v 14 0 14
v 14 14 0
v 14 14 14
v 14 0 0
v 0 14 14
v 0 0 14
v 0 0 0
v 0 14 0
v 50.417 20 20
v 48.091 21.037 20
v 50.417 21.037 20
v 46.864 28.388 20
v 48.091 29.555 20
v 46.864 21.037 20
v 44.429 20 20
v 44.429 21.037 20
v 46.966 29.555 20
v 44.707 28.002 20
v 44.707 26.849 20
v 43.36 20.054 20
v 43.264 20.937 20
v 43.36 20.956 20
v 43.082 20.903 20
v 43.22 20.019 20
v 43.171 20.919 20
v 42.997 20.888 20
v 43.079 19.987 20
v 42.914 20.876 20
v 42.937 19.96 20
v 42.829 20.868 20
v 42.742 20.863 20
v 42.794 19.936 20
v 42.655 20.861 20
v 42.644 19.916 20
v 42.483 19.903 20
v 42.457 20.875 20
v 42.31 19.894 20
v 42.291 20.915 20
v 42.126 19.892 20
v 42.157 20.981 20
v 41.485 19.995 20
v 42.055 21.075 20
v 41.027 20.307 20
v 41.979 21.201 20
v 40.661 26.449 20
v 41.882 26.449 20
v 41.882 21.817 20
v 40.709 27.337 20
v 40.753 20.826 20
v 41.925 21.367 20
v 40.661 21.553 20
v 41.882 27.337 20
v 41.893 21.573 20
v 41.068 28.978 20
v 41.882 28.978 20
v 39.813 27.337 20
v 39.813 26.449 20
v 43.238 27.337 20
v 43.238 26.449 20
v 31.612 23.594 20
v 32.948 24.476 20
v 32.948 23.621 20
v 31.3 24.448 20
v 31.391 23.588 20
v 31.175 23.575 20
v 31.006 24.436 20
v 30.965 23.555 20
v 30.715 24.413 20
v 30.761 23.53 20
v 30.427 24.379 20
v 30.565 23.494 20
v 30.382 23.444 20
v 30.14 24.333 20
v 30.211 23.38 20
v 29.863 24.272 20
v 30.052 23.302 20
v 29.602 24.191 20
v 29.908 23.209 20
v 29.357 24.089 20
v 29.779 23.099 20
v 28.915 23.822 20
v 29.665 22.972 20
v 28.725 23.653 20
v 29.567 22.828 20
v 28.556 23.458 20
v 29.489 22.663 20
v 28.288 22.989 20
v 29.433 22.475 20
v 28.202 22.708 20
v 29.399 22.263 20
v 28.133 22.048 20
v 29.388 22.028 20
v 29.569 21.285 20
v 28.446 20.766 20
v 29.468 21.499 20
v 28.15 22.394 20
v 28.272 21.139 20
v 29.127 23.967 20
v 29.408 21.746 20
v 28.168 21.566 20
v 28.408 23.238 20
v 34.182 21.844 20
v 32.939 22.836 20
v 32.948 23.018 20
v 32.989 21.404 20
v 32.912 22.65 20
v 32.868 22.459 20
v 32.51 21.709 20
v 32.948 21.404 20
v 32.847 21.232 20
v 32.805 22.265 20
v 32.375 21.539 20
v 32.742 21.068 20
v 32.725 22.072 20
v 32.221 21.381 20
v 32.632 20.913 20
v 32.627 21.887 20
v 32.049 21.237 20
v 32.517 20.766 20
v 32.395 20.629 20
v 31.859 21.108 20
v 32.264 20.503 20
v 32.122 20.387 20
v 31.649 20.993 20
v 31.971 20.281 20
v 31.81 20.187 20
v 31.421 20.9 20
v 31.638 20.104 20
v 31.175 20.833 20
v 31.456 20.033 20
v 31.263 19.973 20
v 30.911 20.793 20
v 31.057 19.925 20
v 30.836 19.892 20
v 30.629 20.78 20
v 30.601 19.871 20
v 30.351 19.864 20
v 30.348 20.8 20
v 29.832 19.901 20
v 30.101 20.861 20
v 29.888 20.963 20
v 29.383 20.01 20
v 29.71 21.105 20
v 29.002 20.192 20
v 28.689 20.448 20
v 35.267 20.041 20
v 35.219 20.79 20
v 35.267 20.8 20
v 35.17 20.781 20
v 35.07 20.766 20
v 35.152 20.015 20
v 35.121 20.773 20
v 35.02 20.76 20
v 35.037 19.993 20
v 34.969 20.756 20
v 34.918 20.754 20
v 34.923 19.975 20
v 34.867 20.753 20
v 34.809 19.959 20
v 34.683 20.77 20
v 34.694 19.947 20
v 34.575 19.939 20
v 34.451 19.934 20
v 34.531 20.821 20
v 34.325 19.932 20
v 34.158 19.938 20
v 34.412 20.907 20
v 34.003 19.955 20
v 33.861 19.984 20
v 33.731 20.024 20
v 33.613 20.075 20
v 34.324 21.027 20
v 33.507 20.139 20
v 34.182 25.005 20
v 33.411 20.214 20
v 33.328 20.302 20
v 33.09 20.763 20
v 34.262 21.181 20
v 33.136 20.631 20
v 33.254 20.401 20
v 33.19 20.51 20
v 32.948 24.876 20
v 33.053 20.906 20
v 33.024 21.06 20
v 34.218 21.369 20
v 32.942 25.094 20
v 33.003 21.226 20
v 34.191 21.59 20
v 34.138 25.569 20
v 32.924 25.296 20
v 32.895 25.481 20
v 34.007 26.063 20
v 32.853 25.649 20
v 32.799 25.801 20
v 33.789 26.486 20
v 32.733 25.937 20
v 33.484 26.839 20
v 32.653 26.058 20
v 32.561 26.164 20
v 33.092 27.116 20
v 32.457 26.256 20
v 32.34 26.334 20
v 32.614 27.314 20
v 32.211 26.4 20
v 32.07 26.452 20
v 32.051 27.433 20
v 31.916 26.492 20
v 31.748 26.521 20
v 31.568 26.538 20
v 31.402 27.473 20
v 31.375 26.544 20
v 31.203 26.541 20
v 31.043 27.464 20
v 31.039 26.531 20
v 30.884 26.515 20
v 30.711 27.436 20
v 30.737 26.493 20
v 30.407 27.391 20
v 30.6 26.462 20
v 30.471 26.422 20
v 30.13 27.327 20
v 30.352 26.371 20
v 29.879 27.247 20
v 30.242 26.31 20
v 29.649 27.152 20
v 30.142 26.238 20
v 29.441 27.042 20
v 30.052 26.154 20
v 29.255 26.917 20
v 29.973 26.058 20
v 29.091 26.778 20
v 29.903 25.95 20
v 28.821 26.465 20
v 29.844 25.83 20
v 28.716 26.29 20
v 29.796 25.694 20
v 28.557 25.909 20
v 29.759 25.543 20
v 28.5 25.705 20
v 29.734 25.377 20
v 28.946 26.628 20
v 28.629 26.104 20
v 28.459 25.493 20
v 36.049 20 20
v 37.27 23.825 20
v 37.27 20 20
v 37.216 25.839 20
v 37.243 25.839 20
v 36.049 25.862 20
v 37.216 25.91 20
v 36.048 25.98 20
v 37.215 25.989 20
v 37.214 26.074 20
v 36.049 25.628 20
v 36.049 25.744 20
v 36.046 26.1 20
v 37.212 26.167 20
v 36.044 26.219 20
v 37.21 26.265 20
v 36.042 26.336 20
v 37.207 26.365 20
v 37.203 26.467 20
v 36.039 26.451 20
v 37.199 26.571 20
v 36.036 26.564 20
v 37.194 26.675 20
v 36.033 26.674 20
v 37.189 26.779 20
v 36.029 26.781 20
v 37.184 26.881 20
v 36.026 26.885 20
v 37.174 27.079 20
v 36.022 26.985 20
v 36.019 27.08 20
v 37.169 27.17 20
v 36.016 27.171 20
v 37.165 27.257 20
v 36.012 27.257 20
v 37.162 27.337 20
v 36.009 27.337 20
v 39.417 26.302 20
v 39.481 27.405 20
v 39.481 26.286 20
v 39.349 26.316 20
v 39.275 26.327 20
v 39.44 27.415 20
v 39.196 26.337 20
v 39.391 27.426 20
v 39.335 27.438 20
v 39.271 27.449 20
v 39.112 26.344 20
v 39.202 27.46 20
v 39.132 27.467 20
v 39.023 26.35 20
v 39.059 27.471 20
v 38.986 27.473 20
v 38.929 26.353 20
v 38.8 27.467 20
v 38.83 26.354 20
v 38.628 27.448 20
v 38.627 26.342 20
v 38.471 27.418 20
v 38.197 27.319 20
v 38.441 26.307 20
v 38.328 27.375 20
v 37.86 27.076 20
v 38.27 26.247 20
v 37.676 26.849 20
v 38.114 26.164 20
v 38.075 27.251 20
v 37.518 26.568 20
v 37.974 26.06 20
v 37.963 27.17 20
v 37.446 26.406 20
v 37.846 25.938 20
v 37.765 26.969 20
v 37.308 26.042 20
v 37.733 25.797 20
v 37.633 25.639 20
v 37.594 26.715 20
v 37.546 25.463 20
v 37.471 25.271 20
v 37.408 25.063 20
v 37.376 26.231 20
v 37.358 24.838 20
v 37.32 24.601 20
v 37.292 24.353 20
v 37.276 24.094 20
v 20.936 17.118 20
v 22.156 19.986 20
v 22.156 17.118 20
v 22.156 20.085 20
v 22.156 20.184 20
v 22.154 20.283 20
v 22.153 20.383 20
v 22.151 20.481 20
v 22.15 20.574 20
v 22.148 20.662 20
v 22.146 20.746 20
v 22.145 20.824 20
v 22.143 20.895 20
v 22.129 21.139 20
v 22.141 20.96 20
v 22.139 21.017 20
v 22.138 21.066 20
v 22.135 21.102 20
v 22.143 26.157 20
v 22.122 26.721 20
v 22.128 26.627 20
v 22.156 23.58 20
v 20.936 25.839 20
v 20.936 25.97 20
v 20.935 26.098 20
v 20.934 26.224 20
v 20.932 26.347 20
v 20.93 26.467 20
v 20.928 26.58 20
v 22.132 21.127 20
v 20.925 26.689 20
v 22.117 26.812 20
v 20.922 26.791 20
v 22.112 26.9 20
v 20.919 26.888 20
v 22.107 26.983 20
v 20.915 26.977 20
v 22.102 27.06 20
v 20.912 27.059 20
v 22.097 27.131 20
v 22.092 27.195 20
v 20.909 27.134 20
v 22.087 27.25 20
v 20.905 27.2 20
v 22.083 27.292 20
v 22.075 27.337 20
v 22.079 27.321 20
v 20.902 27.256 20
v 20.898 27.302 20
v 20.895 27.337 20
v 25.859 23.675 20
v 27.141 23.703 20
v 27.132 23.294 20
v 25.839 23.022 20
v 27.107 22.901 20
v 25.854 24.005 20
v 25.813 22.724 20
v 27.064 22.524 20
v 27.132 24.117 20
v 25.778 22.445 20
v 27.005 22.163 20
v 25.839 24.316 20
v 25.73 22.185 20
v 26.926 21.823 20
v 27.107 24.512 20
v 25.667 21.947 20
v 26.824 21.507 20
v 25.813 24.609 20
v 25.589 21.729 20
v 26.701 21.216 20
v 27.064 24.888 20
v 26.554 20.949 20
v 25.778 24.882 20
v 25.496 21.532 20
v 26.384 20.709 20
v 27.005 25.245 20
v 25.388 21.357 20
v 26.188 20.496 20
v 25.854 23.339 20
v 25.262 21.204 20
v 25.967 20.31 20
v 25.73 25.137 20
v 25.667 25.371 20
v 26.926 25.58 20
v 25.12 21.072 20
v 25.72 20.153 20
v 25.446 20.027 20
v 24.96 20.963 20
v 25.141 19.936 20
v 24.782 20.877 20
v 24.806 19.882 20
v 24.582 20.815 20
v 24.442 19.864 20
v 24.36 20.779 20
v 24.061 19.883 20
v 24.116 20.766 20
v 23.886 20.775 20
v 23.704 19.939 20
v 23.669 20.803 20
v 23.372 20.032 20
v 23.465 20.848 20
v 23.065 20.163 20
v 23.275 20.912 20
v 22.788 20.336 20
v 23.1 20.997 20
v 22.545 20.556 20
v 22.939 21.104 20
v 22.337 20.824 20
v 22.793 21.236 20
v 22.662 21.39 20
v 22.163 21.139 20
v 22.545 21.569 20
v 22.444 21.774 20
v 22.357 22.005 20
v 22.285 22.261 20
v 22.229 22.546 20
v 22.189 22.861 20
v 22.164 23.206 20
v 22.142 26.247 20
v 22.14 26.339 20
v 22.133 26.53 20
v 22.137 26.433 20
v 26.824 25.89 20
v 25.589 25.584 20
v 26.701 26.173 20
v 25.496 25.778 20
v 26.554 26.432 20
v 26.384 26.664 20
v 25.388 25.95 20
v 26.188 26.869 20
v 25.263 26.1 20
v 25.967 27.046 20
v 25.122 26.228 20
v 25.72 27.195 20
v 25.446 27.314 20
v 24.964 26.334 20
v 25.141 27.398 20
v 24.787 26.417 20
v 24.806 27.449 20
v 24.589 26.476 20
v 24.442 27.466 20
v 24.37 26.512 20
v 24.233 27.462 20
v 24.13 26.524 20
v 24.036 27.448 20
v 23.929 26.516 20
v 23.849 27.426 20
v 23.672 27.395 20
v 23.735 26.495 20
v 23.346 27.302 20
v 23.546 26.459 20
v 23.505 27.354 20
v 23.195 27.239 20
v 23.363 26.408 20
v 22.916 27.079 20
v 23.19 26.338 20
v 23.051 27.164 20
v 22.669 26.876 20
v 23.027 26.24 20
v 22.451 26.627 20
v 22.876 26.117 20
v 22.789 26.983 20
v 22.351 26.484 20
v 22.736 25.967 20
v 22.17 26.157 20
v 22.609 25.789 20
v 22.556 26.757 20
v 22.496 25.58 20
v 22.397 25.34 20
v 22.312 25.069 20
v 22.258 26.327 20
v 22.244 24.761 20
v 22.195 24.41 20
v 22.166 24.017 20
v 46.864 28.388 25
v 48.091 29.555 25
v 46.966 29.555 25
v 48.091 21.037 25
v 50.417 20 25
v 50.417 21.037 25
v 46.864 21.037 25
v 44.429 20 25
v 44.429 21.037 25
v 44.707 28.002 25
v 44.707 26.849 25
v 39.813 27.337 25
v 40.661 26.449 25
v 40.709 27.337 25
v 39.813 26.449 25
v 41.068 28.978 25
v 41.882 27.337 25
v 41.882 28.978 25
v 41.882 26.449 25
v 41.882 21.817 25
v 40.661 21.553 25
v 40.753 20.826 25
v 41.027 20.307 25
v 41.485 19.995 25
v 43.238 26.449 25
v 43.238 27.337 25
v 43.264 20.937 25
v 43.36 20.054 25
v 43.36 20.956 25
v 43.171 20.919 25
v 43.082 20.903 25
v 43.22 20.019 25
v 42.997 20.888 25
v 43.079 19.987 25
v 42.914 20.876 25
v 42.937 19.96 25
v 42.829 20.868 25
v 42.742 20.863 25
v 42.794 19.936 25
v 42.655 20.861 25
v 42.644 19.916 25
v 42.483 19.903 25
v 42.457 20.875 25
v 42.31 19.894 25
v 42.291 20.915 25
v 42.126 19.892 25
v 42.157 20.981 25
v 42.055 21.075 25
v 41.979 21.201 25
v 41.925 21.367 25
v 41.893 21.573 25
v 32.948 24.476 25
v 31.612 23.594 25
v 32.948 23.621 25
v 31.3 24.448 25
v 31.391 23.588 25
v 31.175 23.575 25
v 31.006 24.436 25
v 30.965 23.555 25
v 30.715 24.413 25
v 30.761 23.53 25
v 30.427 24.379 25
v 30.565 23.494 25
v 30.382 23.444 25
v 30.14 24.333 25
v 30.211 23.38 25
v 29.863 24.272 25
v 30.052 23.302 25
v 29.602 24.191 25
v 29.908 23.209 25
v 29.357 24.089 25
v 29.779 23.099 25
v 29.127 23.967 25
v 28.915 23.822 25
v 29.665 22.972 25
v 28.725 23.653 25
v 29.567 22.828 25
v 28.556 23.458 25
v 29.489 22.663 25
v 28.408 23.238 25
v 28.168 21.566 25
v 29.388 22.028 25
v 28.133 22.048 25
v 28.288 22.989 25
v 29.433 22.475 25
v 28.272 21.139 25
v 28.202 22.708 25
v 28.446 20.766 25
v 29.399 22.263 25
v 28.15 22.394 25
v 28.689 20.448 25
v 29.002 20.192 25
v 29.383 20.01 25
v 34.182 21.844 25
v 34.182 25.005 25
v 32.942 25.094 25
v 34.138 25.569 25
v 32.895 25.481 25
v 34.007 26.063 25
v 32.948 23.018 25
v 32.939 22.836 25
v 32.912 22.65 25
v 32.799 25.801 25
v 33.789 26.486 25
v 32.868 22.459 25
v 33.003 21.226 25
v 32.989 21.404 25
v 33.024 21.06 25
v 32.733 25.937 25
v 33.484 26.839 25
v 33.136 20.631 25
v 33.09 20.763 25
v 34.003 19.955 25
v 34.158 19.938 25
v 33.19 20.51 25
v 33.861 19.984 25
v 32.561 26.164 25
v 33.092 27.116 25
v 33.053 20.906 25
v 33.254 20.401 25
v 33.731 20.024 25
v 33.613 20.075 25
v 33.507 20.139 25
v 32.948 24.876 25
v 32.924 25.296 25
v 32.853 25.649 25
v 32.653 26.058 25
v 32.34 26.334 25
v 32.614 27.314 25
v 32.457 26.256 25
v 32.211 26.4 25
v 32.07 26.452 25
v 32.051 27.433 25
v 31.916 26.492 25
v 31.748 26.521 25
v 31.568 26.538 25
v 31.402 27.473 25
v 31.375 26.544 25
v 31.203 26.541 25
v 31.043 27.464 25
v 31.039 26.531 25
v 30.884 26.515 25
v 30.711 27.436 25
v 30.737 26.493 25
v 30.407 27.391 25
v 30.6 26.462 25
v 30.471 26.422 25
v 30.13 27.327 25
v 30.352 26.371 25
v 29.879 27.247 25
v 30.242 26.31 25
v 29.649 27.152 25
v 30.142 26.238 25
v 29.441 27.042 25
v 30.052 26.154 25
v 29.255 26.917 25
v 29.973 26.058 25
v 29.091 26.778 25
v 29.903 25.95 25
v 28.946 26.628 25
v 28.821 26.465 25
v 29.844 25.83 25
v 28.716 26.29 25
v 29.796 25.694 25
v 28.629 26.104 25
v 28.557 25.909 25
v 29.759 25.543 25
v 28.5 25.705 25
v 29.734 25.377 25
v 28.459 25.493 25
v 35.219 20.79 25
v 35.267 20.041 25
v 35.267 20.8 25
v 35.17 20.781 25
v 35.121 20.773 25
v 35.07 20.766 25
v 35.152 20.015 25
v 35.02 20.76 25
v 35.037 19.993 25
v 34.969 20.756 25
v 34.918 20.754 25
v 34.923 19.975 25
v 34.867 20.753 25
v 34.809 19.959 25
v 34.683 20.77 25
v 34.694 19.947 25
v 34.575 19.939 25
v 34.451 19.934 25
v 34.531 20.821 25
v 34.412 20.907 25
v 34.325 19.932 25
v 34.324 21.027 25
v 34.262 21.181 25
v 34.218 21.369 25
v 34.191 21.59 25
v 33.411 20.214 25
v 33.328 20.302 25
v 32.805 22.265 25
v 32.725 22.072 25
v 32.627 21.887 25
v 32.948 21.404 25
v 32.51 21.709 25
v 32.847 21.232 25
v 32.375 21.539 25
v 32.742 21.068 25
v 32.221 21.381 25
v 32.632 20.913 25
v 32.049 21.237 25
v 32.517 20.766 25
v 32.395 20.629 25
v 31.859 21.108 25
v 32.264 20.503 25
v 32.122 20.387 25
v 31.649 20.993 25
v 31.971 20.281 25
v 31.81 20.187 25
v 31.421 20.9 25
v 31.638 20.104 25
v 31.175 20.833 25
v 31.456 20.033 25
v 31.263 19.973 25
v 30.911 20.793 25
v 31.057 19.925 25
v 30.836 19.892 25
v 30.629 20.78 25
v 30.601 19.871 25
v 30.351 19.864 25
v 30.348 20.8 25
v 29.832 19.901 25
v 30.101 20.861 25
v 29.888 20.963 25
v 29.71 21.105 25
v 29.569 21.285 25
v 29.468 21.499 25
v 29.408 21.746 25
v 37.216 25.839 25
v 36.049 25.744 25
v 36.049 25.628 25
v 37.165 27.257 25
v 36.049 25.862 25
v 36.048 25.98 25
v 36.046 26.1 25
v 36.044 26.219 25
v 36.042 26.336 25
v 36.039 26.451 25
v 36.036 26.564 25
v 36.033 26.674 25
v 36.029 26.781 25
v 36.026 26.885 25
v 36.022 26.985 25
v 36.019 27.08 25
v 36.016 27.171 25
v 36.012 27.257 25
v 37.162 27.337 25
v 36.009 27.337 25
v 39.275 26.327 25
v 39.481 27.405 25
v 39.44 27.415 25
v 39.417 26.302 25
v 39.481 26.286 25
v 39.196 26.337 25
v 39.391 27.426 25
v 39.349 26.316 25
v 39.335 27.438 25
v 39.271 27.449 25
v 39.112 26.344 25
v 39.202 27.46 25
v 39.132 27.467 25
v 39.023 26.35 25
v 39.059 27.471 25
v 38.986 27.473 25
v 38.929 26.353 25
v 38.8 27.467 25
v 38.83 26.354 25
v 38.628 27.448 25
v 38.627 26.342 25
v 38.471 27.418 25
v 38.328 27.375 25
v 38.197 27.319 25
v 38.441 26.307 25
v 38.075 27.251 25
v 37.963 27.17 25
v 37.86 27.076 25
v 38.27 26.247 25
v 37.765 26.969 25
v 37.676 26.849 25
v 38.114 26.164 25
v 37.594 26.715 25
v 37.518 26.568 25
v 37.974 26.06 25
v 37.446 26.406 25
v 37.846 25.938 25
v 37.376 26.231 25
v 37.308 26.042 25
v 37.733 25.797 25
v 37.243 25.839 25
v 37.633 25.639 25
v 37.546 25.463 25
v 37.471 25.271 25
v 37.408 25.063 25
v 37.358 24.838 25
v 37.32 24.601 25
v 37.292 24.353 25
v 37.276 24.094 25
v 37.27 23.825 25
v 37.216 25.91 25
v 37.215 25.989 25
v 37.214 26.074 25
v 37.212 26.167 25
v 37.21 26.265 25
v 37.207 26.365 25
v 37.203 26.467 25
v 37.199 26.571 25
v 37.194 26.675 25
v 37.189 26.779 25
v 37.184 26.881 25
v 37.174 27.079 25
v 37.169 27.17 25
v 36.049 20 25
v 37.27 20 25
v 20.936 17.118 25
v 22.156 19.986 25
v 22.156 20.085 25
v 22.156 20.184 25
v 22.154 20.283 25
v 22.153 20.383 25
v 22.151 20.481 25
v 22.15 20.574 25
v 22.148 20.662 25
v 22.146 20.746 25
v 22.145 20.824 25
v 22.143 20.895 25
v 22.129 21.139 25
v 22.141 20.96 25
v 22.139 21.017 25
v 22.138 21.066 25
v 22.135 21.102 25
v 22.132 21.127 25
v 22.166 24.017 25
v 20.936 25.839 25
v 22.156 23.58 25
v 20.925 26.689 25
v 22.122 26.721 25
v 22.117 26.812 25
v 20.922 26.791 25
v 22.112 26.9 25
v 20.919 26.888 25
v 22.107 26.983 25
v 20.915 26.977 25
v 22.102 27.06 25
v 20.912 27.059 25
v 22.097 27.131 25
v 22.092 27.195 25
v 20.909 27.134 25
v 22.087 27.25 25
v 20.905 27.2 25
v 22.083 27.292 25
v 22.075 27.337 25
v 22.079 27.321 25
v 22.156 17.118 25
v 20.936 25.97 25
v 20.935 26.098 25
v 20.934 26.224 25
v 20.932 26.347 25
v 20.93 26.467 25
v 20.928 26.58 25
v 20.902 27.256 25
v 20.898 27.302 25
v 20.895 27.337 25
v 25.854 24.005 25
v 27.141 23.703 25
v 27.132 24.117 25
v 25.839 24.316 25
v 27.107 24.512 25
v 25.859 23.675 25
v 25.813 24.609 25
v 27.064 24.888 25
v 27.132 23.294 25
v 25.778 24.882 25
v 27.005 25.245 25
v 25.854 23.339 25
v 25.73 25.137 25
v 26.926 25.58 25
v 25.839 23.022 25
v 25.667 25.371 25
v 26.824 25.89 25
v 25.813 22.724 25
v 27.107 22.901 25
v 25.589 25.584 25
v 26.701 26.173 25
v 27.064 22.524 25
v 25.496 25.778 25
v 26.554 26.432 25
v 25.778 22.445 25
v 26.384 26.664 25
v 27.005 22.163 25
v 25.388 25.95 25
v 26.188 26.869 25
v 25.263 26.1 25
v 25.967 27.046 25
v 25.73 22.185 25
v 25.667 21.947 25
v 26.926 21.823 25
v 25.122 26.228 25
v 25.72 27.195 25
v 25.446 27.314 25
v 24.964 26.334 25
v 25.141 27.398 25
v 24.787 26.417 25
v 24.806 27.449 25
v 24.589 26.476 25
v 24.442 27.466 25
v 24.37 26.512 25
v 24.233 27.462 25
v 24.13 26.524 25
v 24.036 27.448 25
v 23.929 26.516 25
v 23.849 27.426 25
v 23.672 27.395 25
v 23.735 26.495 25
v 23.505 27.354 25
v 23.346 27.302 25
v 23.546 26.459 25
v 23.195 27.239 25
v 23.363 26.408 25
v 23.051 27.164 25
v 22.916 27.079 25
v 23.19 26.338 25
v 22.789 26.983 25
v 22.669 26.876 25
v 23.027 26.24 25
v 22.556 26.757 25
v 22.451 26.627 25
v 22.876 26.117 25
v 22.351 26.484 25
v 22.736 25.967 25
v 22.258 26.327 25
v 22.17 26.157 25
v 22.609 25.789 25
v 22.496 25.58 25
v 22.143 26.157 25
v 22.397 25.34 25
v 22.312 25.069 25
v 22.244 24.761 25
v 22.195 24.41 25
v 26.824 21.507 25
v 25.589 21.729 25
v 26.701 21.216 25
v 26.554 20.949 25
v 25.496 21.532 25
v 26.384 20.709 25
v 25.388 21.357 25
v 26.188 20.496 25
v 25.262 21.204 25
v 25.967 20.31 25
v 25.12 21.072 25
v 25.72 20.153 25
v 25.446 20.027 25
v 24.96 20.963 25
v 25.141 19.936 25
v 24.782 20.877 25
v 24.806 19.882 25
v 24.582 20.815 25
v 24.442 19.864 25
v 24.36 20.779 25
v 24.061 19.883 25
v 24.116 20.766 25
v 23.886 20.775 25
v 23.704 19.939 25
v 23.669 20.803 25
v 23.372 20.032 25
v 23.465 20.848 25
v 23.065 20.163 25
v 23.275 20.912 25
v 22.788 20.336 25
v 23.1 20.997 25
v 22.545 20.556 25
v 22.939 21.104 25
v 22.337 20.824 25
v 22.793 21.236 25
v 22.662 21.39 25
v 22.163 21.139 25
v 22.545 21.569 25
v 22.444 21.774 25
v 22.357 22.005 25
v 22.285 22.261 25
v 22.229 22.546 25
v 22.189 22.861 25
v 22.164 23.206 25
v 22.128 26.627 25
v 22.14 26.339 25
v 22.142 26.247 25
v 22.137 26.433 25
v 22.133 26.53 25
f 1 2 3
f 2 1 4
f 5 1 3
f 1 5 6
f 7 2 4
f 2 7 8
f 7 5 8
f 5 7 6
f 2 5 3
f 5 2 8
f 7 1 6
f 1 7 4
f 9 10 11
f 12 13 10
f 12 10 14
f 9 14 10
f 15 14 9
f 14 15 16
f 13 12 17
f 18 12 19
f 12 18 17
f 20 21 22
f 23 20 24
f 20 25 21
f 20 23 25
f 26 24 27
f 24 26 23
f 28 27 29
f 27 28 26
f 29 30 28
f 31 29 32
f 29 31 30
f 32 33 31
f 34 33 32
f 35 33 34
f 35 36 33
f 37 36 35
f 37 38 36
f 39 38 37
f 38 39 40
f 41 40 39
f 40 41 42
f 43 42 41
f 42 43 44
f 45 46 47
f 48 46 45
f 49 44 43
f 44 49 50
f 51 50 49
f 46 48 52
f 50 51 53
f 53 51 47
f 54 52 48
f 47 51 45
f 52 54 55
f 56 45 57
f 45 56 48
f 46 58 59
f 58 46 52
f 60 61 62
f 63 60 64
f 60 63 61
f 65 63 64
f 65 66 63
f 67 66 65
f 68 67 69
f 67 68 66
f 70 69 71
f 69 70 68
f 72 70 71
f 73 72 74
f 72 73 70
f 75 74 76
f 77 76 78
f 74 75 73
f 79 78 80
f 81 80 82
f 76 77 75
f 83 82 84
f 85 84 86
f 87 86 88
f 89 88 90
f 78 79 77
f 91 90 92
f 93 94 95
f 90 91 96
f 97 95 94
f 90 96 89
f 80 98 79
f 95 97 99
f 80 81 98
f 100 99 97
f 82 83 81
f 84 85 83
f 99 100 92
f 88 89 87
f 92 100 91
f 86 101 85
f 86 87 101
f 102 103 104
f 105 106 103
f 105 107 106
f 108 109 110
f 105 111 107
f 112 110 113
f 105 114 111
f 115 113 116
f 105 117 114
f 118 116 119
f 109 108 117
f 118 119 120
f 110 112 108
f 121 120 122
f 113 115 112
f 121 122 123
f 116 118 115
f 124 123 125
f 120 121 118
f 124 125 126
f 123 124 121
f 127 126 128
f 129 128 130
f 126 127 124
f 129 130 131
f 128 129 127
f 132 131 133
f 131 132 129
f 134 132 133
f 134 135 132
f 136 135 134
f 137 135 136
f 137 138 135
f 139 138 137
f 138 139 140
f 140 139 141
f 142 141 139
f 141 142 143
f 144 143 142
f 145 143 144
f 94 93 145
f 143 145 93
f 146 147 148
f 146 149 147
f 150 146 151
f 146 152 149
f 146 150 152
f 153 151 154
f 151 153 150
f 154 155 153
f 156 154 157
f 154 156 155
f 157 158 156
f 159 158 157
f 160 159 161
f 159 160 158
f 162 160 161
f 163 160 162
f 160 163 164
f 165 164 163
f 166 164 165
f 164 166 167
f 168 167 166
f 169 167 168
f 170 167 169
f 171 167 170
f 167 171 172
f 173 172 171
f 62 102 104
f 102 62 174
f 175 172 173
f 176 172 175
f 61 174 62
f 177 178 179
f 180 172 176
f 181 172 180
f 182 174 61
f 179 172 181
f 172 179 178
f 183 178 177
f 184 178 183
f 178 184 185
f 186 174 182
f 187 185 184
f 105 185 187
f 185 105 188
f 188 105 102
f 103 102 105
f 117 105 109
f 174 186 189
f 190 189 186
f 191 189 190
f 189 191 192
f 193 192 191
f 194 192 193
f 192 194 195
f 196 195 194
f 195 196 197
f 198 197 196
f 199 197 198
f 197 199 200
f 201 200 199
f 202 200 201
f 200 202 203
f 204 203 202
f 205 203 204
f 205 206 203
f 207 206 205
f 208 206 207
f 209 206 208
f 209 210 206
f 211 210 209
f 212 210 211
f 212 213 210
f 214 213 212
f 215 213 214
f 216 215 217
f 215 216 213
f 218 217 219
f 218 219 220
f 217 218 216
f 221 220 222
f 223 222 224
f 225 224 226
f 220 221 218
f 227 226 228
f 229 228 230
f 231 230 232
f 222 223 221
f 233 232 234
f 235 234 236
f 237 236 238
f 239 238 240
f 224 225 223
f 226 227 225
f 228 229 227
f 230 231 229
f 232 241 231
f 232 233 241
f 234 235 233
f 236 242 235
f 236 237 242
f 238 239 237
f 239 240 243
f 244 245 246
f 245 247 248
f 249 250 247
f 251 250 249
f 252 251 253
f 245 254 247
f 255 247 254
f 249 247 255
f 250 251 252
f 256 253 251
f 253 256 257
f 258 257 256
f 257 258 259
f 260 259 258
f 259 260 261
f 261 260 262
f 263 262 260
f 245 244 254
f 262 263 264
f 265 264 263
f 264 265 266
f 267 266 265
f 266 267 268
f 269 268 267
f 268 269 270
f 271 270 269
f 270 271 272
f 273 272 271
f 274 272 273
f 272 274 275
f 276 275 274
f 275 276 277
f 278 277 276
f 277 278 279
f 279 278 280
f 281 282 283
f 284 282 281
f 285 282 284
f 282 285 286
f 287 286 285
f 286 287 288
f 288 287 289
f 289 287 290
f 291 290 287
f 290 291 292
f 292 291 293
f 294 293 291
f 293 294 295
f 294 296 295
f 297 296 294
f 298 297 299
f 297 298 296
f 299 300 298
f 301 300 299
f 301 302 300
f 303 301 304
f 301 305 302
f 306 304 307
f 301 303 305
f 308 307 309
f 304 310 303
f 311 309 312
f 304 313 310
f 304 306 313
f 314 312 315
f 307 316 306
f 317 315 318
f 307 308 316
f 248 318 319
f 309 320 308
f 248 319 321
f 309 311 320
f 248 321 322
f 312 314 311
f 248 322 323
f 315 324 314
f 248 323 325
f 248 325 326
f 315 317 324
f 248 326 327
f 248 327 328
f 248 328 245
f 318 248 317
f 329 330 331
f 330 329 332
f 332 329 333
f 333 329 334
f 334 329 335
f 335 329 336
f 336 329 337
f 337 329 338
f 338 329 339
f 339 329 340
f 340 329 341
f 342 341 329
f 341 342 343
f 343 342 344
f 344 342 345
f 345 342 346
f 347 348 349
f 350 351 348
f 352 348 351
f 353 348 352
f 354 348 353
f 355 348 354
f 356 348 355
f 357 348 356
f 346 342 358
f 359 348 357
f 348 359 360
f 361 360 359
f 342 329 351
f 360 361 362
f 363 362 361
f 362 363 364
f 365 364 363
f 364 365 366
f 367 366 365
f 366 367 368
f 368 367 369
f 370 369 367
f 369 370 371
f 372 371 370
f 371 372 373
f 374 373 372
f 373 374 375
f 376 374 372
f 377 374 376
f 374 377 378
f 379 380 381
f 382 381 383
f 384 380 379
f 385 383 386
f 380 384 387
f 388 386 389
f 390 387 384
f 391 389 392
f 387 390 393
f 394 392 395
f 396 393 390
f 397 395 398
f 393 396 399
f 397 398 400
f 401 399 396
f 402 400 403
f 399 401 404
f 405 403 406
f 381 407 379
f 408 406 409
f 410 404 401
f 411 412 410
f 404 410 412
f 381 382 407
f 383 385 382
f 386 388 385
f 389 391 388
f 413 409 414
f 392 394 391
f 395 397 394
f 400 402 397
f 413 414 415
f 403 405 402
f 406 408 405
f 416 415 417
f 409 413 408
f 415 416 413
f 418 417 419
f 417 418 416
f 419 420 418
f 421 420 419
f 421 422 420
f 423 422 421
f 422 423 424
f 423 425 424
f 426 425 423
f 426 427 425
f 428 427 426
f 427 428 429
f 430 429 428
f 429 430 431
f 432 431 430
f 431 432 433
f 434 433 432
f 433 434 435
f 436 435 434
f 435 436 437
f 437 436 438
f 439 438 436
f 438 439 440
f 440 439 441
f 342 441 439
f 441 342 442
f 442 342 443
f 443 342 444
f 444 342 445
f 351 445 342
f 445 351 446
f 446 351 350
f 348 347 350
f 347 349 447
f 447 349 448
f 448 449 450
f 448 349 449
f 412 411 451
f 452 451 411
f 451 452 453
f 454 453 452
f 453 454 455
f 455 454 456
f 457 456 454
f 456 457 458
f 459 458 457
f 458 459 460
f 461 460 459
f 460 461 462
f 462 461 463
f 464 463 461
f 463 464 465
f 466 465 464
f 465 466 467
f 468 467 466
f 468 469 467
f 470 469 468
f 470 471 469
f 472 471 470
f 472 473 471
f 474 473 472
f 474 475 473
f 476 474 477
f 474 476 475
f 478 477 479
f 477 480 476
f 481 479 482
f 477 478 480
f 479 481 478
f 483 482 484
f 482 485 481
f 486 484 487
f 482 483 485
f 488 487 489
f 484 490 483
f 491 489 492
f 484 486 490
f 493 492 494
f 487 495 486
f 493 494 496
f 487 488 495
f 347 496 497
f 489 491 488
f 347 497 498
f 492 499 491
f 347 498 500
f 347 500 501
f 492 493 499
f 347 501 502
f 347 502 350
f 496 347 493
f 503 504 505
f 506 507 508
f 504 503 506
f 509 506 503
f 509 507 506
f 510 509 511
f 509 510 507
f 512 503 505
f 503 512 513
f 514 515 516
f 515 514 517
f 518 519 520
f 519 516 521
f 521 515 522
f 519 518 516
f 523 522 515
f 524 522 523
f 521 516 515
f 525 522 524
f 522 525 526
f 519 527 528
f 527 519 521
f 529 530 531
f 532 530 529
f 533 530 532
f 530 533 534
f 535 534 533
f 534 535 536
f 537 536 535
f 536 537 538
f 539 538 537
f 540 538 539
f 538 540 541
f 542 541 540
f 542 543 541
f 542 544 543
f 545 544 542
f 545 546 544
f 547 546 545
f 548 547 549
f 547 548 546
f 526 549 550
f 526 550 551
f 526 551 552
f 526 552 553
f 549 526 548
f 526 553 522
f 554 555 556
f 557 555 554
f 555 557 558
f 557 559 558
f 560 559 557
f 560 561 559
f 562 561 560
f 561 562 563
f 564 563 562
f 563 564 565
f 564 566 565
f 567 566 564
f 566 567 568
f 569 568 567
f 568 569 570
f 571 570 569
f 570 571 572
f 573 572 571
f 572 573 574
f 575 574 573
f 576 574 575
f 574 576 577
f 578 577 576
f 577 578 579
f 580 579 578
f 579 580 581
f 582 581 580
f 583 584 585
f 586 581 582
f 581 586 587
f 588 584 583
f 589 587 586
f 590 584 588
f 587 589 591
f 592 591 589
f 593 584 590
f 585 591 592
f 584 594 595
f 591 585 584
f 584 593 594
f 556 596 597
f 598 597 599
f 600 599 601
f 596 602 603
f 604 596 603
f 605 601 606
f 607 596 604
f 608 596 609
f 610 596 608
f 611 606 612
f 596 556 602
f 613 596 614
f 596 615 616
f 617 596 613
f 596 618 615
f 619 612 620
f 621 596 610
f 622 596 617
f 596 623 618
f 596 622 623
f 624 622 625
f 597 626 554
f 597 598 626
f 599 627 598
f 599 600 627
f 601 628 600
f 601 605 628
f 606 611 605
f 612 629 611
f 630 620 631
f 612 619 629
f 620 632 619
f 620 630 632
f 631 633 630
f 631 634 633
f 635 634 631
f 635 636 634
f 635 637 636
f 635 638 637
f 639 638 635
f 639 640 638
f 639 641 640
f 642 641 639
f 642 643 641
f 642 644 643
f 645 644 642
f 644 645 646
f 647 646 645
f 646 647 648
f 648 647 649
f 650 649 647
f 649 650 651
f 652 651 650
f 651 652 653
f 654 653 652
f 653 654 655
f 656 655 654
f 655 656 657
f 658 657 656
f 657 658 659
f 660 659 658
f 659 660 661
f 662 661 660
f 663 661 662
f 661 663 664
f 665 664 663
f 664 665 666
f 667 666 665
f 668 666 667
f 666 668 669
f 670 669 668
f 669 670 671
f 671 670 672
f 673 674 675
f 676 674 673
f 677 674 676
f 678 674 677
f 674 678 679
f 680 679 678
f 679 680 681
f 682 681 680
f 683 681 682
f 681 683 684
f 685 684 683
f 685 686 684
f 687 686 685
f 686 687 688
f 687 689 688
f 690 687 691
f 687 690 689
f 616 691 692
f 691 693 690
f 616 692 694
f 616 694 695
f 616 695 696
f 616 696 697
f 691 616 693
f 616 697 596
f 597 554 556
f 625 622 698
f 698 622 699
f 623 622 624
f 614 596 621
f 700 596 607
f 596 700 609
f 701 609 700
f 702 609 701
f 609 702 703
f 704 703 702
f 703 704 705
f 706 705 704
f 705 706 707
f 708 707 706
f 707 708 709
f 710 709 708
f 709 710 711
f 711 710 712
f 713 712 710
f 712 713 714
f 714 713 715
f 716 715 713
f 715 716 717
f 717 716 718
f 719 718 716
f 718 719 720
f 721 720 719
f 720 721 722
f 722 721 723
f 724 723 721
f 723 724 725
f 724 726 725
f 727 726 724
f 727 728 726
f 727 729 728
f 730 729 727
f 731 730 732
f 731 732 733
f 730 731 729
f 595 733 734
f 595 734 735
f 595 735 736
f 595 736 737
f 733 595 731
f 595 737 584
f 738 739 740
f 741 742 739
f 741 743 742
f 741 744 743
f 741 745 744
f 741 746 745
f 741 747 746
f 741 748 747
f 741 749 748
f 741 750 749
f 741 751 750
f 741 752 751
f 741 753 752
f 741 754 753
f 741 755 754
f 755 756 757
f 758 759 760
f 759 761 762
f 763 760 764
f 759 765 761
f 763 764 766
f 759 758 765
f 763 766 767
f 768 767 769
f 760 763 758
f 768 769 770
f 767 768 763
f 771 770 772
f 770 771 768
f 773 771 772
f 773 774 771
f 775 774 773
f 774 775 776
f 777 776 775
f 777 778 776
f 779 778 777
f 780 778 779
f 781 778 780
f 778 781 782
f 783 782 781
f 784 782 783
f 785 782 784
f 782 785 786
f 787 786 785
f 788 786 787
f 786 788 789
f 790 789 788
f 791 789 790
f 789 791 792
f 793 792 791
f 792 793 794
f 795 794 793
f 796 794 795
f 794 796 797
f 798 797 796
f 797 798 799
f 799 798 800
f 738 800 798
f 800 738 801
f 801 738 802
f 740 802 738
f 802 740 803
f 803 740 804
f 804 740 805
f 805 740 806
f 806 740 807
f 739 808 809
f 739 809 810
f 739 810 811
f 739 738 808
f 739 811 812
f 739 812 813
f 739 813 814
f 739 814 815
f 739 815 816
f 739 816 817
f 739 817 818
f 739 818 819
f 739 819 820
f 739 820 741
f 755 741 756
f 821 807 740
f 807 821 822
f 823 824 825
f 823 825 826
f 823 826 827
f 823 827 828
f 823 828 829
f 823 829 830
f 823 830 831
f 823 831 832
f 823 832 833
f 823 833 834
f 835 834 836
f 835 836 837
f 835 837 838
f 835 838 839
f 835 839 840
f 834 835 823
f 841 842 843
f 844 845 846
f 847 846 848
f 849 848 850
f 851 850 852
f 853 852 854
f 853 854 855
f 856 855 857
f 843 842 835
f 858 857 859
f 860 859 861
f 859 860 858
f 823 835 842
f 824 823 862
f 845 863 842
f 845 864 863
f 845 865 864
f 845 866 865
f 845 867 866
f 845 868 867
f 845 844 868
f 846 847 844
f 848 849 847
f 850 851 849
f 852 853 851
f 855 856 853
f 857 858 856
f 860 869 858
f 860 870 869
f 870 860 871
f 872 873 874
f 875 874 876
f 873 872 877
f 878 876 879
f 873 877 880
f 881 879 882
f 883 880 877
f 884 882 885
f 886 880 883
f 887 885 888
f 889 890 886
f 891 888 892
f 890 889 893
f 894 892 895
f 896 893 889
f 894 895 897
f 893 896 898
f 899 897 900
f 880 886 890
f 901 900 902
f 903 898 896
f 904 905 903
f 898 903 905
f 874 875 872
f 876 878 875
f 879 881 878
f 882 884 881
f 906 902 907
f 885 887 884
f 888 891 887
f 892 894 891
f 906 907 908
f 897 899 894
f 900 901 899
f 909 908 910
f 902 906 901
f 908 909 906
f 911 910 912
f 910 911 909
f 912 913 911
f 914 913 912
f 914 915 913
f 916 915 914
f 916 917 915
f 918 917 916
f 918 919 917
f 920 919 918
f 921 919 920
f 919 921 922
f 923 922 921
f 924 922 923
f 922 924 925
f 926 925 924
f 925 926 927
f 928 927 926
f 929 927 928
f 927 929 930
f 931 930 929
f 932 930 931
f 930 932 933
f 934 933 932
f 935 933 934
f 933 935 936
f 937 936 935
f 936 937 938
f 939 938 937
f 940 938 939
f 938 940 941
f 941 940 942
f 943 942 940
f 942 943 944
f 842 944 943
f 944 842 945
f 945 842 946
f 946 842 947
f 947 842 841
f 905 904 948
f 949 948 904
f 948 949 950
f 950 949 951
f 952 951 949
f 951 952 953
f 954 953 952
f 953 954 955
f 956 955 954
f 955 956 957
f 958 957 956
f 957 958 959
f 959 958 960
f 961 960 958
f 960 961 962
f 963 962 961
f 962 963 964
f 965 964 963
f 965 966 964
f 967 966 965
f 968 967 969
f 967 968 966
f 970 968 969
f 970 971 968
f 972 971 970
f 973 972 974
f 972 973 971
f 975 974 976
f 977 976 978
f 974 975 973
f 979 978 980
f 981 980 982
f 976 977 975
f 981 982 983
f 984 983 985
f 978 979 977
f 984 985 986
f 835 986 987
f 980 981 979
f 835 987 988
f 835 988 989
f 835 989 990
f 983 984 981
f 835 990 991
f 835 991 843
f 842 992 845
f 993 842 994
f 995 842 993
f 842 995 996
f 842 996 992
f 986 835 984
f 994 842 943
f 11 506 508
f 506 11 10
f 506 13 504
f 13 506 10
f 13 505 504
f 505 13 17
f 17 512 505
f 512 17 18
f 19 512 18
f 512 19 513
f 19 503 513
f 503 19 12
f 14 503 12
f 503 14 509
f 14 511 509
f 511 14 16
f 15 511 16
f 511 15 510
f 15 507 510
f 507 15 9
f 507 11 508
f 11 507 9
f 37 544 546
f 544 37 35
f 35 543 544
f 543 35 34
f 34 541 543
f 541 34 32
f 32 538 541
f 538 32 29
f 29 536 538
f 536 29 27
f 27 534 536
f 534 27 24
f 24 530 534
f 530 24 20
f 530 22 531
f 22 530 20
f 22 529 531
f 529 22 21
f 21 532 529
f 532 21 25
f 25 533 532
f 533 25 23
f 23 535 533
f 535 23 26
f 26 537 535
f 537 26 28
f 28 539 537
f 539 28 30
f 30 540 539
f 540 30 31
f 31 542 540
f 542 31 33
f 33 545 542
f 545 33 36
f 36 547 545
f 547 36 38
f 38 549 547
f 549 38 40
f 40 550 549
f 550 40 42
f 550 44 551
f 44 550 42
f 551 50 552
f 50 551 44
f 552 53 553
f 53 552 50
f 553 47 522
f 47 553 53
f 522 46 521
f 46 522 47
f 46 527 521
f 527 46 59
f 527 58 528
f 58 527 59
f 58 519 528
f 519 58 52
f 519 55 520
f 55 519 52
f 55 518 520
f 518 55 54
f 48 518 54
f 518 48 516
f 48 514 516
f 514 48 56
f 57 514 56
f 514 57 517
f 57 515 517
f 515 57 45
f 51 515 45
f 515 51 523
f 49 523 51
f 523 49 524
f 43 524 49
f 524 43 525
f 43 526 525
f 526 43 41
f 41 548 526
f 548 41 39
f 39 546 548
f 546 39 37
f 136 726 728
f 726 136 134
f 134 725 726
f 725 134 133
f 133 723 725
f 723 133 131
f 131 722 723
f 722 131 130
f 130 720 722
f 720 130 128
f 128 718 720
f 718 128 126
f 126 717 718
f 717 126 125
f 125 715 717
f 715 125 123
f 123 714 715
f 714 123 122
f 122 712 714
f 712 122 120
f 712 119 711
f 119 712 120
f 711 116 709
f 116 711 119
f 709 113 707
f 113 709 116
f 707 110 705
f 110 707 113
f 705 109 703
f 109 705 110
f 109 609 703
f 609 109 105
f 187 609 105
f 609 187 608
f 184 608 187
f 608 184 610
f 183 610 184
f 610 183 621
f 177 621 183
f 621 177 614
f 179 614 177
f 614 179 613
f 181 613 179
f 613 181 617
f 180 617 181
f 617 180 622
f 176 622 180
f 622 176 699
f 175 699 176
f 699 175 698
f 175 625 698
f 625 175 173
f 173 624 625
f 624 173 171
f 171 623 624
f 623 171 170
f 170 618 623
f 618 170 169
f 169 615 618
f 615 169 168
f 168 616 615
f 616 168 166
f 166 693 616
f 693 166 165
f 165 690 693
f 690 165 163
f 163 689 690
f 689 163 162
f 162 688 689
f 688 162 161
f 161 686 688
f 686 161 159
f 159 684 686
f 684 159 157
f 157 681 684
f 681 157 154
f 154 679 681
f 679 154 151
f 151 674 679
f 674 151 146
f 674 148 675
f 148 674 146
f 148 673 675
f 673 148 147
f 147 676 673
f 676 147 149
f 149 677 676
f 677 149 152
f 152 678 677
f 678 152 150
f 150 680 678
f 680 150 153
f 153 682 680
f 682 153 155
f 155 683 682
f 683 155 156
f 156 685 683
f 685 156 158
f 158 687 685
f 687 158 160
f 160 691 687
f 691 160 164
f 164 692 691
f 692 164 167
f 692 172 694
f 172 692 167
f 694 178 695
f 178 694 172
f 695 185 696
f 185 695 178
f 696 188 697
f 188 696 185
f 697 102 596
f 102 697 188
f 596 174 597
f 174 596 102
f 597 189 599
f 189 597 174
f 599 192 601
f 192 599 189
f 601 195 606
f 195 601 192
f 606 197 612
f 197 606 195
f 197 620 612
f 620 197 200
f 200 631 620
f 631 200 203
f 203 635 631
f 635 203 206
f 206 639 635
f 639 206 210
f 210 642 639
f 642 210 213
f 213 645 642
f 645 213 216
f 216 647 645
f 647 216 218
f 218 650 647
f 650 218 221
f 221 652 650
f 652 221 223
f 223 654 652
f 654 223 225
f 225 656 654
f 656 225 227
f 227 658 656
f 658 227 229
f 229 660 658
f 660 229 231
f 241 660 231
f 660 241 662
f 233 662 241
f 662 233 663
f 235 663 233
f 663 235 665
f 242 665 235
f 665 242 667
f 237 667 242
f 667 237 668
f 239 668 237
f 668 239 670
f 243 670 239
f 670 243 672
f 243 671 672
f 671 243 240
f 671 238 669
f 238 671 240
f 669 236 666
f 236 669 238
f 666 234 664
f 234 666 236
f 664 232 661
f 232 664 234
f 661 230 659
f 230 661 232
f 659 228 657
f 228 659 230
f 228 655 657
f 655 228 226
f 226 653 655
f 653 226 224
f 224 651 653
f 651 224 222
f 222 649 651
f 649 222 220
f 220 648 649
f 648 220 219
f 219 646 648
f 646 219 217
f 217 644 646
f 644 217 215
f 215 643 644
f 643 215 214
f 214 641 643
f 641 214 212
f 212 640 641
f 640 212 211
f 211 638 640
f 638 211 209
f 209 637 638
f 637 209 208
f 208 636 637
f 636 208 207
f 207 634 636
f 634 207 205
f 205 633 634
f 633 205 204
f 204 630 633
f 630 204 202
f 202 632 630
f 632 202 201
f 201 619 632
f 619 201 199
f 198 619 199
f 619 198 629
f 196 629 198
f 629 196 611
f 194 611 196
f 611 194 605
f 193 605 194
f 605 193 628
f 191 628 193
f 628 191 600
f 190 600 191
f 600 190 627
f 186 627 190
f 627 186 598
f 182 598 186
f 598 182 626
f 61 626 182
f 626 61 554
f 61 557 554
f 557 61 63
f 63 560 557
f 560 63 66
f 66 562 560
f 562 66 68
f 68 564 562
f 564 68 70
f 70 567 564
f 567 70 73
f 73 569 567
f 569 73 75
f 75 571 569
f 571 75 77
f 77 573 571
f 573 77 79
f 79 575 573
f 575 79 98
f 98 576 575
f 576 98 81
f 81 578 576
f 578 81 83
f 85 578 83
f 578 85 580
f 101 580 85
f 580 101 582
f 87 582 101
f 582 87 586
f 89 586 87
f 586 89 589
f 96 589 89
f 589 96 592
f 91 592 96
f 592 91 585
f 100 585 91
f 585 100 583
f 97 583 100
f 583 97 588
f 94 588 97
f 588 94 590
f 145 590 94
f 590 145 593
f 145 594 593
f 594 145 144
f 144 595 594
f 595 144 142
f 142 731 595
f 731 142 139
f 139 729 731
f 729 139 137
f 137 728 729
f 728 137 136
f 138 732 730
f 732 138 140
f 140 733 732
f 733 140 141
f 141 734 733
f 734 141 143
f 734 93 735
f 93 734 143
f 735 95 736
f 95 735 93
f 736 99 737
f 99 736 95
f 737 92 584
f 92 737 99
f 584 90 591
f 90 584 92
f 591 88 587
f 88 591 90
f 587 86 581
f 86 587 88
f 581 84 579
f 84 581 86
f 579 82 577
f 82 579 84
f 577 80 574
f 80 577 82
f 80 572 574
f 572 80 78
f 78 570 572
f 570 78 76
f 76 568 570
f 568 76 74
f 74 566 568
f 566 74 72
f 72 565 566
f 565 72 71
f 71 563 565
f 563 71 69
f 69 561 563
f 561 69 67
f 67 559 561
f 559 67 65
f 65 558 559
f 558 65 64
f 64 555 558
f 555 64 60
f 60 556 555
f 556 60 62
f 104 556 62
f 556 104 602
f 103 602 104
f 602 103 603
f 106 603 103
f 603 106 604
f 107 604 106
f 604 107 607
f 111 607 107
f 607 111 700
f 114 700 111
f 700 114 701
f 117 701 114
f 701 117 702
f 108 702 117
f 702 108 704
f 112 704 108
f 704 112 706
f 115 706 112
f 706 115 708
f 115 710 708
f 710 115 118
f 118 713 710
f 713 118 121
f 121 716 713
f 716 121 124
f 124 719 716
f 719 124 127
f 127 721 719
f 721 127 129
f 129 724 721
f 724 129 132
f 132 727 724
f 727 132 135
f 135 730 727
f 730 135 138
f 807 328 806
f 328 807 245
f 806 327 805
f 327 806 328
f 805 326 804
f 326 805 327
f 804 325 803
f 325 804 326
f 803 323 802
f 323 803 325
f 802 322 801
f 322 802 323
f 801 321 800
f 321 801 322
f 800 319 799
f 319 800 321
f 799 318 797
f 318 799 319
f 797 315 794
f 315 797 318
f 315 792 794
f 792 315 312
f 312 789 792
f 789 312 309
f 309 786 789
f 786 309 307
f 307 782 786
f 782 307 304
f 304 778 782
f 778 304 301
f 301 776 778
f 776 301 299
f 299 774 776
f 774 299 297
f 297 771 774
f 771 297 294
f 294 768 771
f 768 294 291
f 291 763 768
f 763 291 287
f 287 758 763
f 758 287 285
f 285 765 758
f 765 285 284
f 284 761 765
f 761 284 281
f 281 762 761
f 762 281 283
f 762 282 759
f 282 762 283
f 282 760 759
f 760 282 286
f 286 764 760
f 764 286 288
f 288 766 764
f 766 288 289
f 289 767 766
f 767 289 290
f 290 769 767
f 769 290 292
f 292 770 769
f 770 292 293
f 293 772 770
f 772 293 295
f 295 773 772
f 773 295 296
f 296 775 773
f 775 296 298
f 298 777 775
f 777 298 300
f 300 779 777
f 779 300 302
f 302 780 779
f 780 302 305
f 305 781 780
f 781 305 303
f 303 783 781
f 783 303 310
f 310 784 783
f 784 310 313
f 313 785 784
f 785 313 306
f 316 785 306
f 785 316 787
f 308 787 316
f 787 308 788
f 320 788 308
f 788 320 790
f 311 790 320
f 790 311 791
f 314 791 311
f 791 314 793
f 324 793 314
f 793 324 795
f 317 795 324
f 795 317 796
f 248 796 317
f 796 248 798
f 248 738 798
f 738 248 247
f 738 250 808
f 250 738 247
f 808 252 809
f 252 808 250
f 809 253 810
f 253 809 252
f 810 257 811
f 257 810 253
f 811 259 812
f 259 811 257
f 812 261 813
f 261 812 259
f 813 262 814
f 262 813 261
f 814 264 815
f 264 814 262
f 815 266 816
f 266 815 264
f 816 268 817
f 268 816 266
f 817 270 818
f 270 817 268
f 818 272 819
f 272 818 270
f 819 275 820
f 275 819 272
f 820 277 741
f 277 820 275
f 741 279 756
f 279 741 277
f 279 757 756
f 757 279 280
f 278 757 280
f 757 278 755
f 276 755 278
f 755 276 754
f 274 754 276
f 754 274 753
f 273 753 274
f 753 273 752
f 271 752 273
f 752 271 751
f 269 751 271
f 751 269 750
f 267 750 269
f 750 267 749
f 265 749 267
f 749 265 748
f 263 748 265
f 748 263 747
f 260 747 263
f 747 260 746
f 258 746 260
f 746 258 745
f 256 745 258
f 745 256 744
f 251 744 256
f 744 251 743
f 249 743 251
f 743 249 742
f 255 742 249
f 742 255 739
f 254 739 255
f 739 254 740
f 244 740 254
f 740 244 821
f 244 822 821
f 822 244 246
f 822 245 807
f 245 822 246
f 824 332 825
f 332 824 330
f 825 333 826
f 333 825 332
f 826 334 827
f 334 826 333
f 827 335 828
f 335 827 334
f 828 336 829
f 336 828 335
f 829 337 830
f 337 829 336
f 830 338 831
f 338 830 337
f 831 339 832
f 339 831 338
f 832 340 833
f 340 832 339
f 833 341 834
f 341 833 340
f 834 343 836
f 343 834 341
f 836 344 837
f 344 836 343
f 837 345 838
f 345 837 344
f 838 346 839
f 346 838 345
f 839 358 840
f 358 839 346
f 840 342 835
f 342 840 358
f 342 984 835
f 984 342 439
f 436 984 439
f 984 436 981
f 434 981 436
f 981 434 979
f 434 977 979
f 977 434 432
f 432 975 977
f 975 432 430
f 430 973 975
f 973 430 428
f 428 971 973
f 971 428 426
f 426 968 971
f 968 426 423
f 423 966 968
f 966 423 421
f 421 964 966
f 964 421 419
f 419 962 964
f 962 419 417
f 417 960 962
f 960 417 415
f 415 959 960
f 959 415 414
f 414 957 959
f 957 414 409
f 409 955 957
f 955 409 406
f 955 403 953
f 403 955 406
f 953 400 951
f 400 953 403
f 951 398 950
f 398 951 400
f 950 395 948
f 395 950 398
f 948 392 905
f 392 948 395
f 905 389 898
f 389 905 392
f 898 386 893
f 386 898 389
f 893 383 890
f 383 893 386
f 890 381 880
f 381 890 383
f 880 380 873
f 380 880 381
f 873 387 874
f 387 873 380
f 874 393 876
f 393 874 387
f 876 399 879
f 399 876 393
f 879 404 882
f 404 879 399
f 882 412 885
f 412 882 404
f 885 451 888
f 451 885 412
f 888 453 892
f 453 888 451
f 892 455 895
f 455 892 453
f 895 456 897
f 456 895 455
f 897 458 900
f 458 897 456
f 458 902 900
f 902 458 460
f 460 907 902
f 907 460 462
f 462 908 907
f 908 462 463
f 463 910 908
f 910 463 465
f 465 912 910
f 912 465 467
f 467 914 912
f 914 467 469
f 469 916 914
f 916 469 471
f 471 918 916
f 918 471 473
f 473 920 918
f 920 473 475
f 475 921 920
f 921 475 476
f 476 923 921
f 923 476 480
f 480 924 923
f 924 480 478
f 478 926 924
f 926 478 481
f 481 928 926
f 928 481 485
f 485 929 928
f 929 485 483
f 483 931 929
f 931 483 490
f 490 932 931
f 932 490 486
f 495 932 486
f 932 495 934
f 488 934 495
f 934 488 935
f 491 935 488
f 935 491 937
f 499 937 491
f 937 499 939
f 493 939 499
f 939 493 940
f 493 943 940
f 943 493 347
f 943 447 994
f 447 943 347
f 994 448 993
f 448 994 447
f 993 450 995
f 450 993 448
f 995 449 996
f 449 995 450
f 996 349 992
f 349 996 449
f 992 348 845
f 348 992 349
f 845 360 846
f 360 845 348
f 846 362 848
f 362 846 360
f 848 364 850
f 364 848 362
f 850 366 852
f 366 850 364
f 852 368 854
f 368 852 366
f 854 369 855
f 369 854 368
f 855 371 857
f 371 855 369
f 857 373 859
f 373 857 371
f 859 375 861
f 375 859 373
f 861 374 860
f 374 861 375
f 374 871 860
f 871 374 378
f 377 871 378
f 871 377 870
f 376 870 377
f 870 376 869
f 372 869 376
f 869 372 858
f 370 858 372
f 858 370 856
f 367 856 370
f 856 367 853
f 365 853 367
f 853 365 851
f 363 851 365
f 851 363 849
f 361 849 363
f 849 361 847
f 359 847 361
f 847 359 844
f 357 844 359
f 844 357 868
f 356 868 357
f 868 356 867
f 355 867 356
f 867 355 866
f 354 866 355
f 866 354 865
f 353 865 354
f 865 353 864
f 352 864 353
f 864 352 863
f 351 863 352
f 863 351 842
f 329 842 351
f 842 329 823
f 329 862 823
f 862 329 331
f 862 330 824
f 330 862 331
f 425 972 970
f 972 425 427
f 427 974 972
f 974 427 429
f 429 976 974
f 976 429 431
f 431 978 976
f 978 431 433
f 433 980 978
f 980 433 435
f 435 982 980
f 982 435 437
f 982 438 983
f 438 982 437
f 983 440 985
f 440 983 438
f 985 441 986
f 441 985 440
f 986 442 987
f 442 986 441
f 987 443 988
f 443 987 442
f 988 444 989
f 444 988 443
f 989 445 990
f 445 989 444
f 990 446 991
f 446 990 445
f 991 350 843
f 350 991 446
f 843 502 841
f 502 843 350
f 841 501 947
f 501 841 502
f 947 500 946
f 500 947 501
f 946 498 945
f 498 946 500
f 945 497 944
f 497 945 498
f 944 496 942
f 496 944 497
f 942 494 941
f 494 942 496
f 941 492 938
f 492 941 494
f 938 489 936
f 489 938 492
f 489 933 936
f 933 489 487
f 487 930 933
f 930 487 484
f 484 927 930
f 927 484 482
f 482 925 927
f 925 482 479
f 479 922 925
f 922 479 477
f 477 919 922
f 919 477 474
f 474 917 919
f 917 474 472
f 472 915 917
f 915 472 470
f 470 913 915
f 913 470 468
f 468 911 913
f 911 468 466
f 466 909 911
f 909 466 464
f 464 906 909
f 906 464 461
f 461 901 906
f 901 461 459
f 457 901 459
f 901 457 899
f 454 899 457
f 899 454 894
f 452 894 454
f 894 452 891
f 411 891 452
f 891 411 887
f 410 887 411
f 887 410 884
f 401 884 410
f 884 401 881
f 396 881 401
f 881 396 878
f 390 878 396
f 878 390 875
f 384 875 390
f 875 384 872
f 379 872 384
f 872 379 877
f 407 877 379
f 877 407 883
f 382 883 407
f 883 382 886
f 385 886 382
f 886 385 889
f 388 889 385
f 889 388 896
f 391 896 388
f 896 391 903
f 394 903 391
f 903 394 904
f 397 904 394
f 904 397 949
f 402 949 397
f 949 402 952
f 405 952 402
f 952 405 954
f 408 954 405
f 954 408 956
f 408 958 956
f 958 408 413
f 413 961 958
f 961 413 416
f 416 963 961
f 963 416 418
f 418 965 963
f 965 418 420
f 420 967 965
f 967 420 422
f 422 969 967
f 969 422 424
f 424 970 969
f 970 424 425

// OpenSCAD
//[CUSTOMIZATION]
// X Dimension
xdim=14;
// Y Dimension
ydim=10;
// Z Dimension
zdim=16;
// Message
txt="part1";
module __END_CUSTOMIZATIONS () {}
cube(xdim,ydim,zdim);
translate([20,20,20]) { linear_extrude(5) text(txt, font="Liberation Sans"); }
